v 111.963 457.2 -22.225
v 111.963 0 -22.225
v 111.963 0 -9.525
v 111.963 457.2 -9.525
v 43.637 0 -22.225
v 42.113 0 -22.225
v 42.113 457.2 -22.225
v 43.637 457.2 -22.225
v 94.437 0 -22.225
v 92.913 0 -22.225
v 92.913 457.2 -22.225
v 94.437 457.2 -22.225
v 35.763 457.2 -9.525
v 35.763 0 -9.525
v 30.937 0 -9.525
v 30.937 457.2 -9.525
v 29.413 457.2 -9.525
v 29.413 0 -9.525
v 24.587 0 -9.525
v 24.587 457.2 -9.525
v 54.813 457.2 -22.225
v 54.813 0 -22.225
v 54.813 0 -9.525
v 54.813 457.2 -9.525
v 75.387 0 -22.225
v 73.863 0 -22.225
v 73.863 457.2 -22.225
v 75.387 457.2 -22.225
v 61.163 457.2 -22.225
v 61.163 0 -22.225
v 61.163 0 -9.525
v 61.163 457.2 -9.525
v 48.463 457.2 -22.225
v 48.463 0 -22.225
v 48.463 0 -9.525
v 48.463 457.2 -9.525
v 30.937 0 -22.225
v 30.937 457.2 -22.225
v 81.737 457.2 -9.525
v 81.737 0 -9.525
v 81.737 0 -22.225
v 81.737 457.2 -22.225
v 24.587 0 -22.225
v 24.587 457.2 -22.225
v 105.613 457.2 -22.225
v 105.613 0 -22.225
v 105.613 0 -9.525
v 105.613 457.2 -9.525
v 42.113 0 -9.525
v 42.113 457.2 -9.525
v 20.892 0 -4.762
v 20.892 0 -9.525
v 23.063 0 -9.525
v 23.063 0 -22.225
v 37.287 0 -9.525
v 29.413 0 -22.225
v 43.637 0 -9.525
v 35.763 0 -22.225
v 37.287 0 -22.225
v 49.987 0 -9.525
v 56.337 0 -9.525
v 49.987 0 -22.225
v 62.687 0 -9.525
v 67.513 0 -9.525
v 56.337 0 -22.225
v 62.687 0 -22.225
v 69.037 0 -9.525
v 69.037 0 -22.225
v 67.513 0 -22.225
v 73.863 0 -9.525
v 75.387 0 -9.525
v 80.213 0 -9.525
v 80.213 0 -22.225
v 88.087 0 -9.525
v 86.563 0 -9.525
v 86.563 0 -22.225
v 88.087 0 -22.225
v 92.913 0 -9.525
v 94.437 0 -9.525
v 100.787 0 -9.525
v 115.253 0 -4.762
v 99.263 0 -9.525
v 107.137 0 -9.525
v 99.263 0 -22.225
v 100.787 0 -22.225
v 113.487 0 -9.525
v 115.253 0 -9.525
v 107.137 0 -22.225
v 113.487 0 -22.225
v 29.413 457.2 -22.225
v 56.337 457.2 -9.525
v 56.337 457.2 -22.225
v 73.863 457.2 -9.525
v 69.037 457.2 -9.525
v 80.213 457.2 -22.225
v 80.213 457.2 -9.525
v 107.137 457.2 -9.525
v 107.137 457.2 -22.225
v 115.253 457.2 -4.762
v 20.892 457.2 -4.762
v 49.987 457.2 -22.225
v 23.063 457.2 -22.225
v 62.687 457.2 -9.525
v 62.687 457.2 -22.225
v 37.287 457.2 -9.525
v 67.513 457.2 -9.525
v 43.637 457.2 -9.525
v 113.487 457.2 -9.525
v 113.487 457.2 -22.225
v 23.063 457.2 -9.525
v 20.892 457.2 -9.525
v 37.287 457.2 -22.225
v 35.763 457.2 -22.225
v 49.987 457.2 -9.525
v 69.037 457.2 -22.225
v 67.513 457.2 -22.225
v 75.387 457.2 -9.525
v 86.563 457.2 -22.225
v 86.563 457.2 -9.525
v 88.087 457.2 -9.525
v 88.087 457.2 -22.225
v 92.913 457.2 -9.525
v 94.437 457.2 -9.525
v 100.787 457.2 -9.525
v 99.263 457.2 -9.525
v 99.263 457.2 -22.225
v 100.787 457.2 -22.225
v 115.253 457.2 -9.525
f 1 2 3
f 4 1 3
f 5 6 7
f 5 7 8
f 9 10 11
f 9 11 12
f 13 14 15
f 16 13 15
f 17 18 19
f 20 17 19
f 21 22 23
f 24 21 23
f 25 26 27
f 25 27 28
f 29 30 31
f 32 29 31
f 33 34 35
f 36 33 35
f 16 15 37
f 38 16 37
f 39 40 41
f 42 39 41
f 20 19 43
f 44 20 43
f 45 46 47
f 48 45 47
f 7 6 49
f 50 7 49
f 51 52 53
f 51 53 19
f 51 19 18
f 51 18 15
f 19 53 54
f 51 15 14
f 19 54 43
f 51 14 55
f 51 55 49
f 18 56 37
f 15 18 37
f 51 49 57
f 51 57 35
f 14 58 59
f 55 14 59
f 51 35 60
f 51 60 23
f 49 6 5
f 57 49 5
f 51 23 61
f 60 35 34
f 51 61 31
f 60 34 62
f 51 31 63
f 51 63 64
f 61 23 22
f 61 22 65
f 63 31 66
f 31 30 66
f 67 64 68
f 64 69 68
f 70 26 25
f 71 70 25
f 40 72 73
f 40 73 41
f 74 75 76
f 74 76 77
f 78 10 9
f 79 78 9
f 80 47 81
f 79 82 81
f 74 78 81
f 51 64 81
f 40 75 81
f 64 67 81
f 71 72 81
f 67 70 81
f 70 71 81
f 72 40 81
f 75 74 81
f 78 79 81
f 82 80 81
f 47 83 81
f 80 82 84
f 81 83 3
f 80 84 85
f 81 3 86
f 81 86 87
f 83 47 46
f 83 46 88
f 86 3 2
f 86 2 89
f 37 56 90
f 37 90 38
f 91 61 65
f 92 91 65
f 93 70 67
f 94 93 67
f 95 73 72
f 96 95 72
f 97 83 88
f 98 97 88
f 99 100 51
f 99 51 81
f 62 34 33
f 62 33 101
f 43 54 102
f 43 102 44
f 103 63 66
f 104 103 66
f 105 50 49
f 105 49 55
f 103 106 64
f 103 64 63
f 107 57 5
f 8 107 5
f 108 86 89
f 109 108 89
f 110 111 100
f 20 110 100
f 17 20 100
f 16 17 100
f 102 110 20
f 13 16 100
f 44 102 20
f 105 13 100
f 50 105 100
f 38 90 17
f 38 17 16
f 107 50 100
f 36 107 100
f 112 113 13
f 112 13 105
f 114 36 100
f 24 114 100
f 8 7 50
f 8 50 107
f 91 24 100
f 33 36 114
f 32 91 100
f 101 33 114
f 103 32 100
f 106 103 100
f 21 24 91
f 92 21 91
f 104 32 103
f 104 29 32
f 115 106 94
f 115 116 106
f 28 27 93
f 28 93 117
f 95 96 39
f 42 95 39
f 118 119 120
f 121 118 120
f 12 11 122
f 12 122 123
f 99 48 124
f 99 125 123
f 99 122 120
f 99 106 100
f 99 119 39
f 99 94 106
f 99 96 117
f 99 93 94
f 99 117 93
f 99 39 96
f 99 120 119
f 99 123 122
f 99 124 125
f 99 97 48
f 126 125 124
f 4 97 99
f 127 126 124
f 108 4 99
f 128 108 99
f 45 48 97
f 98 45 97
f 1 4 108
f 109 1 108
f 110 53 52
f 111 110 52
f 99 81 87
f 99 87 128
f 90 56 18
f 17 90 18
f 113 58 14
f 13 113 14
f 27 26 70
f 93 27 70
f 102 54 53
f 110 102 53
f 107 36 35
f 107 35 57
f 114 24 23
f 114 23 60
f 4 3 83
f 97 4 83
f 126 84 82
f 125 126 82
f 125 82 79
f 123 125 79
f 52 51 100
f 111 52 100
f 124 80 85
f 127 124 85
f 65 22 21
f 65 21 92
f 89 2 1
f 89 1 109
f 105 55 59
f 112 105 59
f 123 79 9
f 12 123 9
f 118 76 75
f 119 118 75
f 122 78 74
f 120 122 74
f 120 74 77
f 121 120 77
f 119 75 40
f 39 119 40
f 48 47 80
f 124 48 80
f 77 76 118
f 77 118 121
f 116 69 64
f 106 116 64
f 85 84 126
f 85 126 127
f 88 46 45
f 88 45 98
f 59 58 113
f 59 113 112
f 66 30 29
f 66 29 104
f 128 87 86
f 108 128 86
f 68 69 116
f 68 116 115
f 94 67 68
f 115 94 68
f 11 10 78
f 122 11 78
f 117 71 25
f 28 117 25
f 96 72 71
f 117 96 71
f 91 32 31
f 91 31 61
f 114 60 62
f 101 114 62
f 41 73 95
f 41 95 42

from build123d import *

# Parameters (mm, degrees)
BOSS_EXTRUDE1_DEPTH = 457.2
SKETCH2_W           = 136.525
SKETCH2_H           = 4.7625
CUT_EXTRUDE1_DEPTH  = 479.481428682
SKETCH3_W           = 132.265960651
SKETCH3_H           = 13.462
CUT_EXTRUDE2_DEPTH  = 479.481428682
SKETCH9_OUTSIDE_W   = 234.019
SKETCH9_OUTSIDE_H   = 554.694
SKETCH9_OUTSIDE_W_2 = 94.360380141
SKETCH9_OUTSIDE_H_2 = 481.67440371
CUT_EXTRUDE3_DEPTH  = 478.468171223


with BuildPart() as part:
    # Sketch1 → Boss-Extrude1 (new body)
    with BuildSketch(Plane(origin=(0, 0, 0), x_dir=(1, 0, 0), z_dir=(0, 1, 0))):
        with BuildLine():
            Line((0, 0), (136.525, 0))
            Line((136.525, 0), (136.525, 9.525))
            Line((136.525, 9.525), (132.5372, 9.525))
            Line((132.5372, 9.525), (132.5372, 34.925))
            ThreePointArc((132.5372, 34.925), (131.7752, 35.687), (131.0132, 34.925))
            Line((131.0132, 34.925), (131.0132, 9.525))
            Line((131.0132, 9.525), (126.1872, 9.525))
            Line((126.1872, 9.525), (126.1872, 34.925))
            ThreePointArc((126.1872, 34.925), (125.4252, 35.687), (124.6632, 34.925))
            Line((124.6632, 34.925), (124.6632, 9.525))
            Line((124.6632, 9.525), (119.8372, 9.525))
            Line((119.8372, 9.525), (119.8372, 34.925))
            ThreePointArc((119.8372, 34.925), (119.0752, 35.687), (118.3132, 34.925))
            Line((118.3132, 34.925), (118.3132, 9.525))
            Line((118.3132, 9.525), (113.4872, 9.525))
            Line((113.4872, 9.525), (113.4872, 34.925))
            ThreePointArc((113.4872, 34.925), (112.7252, 35.687), (111.9632, 34.925))
            Line((111.9632, 34.925), (111.9632, 9.525))
            Line((111.9632, 9.525), (107.1372, 9.525))
            Line((107.1372, 9.525), (107.1372, 34.925))
            ThreePointArc((107.1372, 34.925), (106.3752, 35.687), (105.6132, 34.925))
            Line((105.6132, 34.925), (105.6132, 9.525))
            Line((105.6132, 9.525), (100.7872, 9.525))
            Line((100.7872, 9.525), (100.7872, 34.925))
            ThreePointArc((100.7872, 34.925), (100.0252, 35.687), (99.2632, 34.925))
            Line((99.2632, 34.925), (99.2632, 9.525))
            Line((99.2632, 9.525), (94.4372, 9.525))
            Line((94.4372, 9.525), (94.4372, 34.925))
            ThreePointArc((94.4372, 34.925), (93.6752, 35.687), (92.9132, 34.925))
            Line((92.9132, 34.925), (92.9132, 9.525))
            Line((92.9132, 9.525), (88.0872, 9.525))
            Line((88.0872, 9.525), (88.0872, 34.925))
            ThreePointArc((88.0872, 34.925), (87.3252, 35.687), (86.5632, 34.925))
            Line((86.5632, 34.925), (86.5632, 9.525))
            Line((86.5632, 9.525), (81.7372, 9.525))
            Line((81.7372, 9.525), (81.7372, 34.925))
            ThreePointArc((81.7372, 34.925), (80.9752, 35.687), (80.2132, 34.925))
            Line((80.2132, 34.925), (80.2132, 9.525))
            Line((80.2132, 9.525), (75.3872, 9.525))
            Line((75.3872, 9.525), (75.3872, 34.925))
            ThreePointArc((75.3872, 34.925), (74.6252, 35.687), (73.8632, 34.925))
            Line((73.8632, 34.925), (73.8632, 9.525))
            Line((73.8632, 9.525), (69.0372, 9.525))
            Line((69.0372, 9.525), (69.0372, 34.925))
            ThreePointArc((69.0372, 34.925), (68.2752, 35.687), (67.5132, 34.925))
            Line((67.5132, 34.925), (67.5132, 9.525))
            Line((67.5132, 9.525), (62.6872, 9.525))
            Line((62.6872, 9.525), (62.6872, 34.925))
            ThreePointArc((62.6872, 34.925), (61.9252, 35.687), (61.1632, 34.925))
            Line((61.1632, 34.925), (61.1632, 9.525))
            Line((61.1632, 9.525), (56.3372, 9.525))
            Line((56.3372, 9.525), (56.3372, 34.925))
            ThreePointArc((56.3372, 34.925), (55.5752, 35.687), (54.8132, 34.925))
            Line((54.8132, 34.925), (54.8132, 9.525))
            Line((54.8132, 9.525), (49.9872, 9.525))
            Line((49.9872, 9.525), (49.9872, 34.925))
            ThreePointArc((49.9872, 34.925), (49.2252, 35.687), (48.4632, 34.925))
            Line((48.4632, 34.925), (48.4632, 9.525))
            Line((48.4632, 9.525), (43.6372, 9.525))
            Line((43.6372, 9.525), (43.6372, 34.925))
            ThreePointArc((43.6372, 34.925), (42.8752, 35.687), (42.1132, 34.925))
            Line((42.1132, 34.925), (42.1132, 9.525))
            Line((42.1132, 9.525), (37.2872, 9.525))
            Line((37.2872, 9.525), (37.2872, 34.925))
            ThreePointArc((37.2872, 34.925), (36.5252, 35.687), (35.7632, 34.925))
            Line((35.7632, 34.925), (35.7632, 9.525))
            Line((35.7632, 9.525), (30.9372, 9.525))
            Line((30.9372, 9.525), (30.9372, 34.925))
            ThreePointArc((30.9372, 34.925), (30.1752, 35.687), (29.4132, 34.925))
            Line((29.4132, 34.925), (29.4132, 9.525))
            Line((29.4132, 9.525), (24.5872, 9.525))
            Line((24.5872, 9.525), (24.5872, 34.925))
            ThreePointArc((24.5872, 34.925), (23.8252, 35.687), (23.0632, 34.925))
            Line((23.0632, 34.925), (23.0632, 9.525))
            Line((23.0632, 9.525), (18.2372, 9.525))
            Line((18.2372, 9.525), (18.2372, 34.925))
            ThreePointArc((18.2372, 34.925), (17.4752, 35.687), (16.7132, 34.925))
            Line((16.7132, 34.925), (16.7132, 9.525))
            Line((16.7132, 9.525), (11.8872, 9.525))
            Line((11.8872, 9.525), (11.8872, 34.925))
            ThreePointArc((11.8872, 34.925), (11.1252, 35.687), (10.3632, 34.925))
            Line((10.3632, 34.925), (10.3632, 9.525))
            Line((10.3632, 9.525), (5.5372, 9.525))
            Line((5.5372, 9.525), (5.5372, 34.925))
            ThreePointArc((5.5372, 34.925), (4.7752, 35.687), (4.0132, 34.925))
            Line((4.0132, 34.925), (4.0132, 9.525))
            Line((4.0132, 9.525), (0, 9.525))
            Line((0, 9.525), (0, 0))
        make_face()
    extrude(amount=BOSS_EXTRUDE1_DEPTH)

    # Sketch2 → Cut-Extrude1 (cut, through all)
    with BuildSketch(Plane(origin=(0, 457.2, 0), x_dir=(1, 0, 0), z_dir=(0, 1, 0))):
        with Locations((68.2625, 2.38125)):
            Rectangle(SKETCH2_W, SKETCH2_H)
    extrude(amount=-CUT_EXTRUDE1_DEPTH, mode=Mode.SUBTRACT)

    # Sketch3 → Cut-Extrude2 (cut, through all)
    with BuildSketch(Plane.XZ):
        with Locations((69.2831702, -28.956)):
            Rectangle(SKETCH3_W, SKETCH3_H)
    extrude(amount=-CUT_EXTRUDE2_DEPTH, mode=Mode.SUBTRACT)

    # Sketch9 outside → Cut-Extrude3 (cut, through all)
    with BuildSketch(Plane.XY.offset(-4.7625)):
        with Locations((68.2625, 228.6)):
            Rectangle(SKETCH9_OUTSIDE_W, SKETCH9_OUTSIDE_H)
        with Locations((68.07230993, 238.432707494)):
            Rectangle(SKETCH9_OUTSIDE_W_2, SKETCH9_OUTSIDE_H_2, mode=Mode.SUBTRACT)
    extrude(amount=-CUT_EXTRUDE3_DEPTH, mode=Mode.SUBTRACT)


solid = part.part
